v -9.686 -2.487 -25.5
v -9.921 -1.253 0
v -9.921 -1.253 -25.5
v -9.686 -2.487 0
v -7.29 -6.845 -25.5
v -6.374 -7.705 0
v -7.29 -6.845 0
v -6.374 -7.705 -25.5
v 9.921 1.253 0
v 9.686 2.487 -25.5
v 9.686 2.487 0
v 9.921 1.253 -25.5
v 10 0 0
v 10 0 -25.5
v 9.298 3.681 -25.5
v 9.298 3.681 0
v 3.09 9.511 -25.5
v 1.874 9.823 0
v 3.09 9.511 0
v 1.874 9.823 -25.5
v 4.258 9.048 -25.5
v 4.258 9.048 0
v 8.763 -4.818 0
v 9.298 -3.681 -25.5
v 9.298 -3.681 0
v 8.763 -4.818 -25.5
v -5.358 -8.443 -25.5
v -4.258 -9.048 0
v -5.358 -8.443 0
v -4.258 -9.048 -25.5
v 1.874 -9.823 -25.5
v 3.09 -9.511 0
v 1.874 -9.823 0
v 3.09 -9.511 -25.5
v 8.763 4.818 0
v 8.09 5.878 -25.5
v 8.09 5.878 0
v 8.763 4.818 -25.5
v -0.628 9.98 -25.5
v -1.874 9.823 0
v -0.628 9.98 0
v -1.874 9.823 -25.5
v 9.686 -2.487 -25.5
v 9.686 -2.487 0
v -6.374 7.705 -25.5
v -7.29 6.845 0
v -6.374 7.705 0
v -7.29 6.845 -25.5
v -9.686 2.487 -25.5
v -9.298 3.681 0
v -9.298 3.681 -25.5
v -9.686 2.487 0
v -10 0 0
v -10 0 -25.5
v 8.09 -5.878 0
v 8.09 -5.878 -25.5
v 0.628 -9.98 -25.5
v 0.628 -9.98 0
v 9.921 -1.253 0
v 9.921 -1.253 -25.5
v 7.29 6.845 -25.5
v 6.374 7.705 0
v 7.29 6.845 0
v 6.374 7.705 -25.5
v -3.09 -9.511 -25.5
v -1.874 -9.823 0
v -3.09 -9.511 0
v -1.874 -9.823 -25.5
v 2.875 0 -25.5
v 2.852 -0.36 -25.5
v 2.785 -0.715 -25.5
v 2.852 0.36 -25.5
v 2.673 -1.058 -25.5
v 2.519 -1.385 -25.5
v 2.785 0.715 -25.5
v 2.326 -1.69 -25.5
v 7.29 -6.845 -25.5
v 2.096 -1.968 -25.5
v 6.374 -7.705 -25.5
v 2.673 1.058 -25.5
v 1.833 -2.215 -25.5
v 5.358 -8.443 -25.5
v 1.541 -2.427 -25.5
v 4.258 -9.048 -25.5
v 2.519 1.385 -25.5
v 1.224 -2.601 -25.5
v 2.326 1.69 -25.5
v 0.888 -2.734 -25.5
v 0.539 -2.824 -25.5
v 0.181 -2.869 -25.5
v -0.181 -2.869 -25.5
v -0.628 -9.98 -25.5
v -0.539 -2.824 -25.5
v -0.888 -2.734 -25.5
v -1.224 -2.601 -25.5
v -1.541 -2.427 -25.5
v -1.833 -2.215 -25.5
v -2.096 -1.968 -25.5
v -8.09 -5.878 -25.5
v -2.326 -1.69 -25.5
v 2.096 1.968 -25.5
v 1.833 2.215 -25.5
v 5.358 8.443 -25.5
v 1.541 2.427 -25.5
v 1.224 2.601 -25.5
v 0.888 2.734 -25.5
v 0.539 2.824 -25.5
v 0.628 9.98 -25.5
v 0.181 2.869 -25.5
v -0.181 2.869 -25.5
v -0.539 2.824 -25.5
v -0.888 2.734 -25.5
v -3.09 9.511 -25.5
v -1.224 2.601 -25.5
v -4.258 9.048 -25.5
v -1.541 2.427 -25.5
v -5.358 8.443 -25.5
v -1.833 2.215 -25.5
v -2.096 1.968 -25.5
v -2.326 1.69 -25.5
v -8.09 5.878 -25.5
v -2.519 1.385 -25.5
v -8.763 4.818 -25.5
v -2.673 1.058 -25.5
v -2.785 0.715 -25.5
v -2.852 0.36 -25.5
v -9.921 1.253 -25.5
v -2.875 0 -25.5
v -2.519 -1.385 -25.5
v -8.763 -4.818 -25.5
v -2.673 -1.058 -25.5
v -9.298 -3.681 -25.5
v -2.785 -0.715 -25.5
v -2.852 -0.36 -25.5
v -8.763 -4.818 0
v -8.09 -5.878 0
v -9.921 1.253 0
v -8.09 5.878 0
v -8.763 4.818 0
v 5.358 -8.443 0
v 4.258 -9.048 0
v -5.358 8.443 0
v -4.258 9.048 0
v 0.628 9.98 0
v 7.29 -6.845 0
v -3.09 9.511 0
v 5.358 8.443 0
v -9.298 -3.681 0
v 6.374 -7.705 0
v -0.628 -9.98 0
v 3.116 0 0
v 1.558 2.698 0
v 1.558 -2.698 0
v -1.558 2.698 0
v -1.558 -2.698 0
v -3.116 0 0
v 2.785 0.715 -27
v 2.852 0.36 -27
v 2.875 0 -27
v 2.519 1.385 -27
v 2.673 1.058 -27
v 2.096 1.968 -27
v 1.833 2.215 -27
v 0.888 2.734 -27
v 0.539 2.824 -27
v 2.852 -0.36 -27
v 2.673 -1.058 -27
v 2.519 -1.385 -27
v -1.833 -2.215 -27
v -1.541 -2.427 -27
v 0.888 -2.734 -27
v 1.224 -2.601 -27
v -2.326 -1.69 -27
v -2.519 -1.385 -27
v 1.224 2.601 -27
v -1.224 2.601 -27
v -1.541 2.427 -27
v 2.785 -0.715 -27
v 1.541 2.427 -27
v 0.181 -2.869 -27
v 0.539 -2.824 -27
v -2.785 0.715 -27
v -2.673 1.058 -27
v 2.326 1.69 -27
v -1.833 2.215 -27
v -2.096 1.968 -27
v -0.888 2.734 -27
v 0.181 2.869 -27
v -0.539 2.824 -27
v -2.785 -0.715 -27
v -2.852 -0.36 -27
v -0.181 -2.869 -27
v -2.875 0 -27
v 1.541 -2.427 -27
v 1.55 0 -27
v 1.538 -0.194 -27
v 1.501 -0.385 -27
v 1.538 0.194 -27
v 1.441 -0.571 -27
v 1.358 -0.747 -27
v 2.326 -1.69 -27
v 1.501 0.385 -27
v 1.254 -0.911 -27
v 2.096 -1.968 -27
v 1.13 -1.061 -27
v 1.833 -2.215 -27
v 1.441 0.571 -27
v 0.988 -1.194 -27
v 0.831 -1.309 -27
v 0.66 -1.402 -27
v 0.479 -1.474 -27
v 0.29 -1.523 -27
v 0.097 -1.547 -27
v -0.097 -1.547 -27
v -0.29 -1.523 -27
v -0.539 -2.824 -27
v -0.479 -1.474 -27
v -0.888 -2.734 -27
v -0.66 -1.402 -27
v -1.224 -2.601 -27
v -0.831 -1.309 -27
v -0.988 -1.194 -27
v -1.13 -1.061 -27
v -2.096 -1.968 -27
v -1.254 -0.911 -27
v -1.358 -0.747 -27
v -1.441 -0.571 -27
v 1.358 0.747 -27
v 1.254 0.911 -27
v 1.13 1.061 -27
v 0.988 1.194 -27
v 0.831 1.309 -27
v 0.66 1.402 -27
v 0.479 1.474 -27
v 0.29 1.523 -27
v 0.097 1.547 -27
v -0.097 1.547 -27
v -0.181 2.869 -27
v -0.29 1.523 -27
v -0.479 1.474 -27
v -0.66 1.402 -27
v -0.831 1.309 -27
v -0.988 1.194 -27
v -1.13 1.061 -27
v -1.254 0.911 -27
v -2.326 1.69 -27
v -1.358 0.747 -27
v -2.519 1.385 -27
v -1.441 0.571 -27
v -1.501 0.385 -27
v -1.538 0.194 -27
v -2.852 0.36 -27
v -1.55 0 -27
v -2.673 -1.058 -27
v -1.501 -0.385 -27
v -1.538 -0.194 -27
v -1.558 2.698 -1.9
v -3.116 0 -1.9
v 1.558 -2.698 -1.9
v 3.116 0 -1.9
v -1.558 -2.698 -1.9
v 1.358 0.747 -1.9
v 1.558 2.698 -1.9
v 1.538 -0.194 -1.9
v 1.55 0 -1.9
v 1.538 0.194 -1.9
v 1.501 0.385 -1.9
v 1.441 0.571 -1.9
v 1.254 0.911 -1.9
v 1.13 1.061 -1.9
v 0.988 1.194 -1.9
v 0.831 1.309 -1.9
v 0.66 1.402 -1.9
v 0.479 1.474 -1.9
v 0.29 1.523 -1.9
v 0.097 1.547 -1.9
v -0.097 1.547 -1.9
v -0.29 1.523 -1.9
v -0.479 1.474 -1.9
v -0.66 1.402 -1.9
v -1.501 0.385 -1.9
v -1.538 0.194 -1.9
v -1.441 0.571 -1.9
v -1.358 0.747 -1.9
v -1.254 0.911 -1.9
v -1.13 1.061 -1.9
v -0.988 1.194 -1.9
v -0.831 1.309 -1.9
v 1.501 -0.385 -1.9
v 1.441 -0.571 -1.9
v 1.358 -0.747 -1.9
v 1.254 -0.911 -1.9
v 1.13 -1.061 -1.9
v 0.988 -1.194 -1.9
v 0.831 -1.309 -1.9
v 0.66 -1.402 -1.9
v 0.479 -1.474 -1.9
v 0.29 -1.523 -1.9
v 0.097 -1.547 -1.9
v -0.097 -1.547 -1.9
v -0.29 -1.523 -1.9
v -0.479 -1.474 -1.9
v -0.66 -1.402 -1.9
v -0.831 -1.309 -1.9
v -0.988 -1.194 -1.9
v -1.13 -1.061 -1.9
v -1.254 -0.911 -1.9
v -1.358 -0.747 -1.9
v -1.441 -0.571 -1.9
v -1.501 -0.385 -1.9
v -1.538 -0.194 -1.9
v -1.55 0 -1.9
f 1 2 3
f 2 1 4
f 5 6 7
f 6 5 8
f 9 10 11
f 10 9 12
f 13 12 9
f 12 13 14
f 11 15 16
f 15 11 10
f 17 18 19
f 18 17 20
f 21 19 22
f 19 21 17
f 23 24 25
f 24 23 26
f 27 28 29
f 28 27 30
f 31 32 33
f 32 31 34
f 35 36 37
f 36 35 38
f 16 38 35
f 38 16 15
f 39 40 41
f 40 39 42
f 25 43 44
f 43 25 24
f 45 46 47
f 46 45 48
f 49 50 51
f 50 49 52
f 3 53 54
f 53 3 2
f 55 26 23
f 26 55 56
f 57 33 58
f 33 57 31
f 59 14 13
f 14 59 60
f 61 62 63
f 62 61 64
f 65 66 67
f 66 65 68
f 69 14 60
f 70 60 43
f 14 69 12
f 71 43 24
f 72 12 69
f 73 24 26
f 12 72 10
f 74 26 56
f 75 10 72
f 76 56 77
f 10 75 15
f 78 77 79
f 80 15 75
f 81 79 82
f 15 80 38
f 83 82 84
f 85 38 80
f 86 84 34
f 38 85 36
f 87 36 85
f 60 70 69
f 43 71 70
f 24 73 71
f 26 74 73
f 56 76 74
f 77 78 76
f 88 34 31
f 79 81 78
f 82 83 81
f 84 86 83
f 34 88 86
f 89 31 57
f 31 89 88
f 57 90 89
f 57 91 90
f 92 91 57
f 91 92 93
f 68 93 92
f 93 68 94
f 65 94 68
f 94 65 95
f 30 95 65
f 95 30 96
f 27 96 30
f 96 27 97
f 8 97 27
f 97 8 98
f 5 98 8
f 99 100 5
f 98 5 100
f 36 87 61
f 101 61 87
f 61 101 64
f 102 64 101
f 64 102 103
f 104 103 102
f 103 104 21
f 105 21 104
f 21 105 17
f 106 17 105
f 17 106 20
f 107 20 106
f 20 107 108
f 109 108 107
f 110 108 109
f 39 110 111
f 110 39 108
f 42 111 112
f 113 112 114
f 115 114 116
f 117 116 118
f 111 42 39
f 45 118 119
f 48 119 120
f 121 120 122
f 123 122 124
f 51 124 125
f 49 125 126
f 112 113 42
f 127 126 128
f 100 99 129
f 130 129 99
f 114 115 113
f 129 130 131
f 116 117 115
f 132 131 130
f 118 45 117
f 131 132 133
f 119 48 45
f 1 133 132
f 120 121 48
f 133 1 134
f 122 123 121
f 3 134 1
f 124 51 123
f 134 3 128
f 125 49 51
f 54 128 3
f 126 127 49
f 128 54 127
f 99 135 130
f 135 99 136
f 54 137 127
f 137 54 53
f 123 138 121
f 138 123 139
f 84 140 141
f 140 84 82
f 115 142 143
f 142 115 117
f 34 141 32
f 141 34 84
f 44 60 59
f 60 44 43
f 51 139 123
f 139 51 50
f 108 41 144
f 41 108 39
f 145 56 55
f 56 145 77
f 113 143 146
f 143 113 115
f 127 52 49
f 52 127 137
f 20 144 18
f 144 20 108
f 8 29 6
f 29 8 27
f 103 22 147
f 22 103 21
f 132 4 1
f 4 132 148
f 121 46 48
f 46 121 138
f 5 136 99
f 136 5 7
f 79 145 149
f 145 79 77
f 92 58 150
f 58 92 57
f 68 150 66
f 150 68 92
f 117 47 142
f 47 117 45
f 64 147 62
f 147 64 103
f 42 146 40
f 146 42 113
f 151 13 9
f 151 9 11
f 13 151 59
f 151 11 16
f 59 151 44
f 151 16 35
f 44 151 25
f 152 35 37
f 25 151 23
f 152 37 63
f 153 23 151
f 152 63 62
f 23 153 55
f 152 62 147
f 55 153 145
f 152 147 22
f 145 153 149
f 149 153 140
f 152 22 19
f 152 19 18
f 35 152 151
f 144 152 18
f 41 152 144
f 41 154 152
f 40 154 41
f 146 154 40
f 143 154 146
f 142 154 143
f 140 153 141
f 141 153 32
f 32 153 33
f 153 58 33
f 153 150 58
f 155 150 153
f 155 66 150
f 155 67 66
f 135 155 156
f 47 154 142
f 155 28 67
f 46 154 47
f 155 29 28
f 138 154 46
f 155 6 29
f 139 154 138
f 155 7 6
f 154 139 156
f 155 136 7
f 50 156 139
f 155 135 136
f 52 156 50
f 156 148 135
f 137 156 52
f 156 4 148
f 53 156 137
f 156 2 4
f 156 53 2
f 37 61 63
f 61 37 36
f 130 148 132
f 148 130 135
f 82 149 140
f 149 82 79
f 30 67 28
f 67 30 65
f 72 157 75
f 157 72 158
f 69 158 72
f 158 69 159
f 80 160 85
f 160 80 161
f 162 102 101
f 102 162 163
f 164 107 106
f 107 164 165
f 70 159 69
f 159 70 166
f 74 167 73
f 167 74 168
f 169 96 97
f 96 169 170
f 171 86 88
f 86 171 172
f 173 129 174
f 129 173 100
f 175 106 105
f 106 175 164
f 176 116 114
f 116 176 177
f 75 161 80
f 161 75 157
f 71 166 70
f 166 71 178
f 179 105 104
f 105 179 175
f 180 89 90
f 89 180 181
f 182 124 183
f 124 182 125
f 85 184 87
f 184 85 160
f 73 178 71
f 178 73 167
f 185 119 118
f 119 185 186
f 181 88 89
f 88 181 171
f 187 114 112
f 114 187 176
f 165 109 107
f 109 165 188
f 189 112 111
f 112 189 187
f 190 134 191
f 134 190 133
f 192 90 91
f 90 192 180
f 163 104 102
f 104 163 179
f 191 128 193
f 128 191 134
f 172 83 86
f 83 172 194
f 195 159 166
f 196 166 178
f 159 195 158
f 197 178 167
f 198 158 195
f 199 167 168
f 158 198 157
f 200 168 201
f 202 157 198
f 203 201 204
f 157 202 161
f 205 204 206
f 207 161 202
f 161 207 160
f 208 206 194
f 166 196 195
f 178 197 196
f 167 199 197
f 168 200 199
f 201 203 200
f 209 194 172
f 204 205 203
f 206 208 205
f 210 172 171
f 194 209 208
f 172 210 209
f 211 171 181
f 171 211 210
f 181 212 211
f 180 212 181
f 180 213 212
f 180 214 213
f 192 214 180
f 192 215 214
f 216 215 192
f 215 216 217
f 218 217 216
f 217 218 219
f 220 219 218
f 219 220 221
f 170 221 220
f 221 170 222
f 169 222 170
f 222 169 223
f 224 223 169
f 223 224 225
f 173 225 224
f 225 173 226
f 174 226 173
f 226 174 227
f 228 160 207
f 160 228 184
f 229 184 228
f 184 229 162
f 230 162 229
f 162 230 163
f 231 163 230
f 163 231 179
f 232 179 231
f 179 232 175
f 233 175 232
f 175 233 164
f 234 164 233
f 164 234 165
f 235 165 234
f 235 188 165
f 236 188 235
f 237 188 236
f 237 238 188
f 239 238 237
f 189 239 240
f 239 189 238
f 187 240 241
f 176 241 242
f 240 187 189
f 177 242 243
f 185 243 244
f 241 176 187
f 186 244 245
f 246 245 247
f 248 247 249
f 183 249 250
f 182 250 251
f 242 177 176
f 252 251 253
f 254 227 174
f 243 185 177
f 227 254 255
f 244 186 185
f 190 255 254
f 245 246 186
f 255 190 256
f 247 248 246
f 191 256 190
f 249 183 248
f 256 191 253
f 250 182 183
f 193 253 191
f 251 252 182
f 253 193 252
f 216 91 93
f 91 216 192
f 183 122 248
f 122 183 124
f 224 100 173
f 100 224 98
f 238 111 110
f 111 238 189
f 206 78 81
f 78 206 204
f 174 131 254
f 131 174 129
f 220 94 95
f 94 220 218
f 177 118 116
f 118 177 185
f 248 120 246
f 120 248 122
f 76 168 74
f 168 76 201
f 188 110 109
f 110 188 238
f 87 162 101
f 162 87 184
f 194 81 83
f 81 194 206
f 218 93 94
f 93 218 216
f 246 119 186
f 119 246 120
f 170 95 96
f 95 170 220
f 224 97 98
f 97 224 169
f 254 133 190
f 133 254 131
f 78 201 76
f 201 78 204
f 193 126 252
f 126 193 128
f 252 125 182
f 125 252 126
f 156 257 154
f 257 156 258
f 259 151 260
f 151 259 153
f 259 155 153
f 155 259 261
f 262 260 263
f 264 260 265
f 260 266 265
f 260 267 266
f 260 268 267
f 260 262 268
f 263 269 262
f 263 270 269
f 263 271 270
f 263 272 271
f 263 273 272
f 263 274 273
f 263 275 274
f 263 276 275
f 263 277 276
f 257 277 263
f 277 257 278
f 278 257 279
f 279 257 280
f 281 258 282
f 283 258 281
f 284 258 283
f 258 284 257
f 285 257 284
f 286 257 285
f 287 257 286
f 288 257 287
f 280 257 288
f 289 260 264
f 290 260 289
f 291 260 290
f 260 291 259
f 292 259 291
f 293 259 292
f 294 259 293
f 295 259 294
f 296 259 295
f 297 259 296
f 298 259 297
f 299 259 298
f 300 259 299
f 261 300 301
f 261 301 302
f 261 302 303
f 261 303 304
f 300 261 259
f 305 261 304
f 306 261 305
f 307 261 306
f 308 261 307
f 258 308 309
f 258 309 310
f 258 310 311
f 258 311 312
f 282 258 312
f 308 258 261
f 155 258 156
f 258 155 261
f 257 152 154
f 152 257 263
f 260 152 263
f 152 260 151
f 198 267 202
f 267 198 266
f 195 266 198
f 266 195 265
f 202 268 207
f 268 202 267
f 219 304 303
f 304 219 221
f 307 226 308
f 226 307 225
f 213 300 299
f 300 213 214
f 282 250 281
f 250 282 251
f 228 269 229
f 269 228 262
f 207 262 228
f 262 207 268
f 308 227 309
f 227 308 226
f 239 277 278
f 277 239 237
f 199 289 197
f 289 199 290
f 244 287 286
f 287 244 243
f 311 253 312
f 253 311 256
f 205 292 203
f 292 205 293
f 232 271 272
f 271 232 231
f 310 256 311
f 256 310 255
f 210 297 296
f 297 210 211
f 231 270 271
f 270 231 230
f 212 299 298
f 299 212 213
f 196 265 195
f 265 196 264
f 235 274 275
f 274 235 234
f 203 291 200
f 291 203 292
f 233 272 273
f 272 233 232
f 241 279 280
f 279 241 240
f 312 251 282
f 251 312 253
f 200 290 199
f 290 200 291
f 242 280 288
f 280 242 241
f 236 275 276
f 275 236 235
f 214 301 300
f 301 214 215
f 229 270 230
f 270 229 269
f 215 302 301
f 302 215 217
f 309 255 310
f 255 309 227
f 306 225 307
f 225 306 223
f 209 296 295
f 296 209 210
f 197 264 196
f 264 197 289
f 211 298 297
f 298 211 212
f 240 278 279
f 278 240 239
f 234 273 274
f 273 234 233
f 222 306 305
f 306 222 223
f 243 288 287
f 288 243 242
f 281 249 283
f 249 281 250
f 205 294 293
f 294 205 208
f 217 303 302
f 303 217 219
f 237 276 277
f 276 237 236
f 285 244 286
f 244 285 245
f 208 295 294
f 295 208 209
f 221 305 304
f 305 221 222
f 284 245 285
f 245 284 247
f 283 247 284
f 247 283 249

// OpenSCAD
$fn = 50;


difference() {
	union() {
		translate(v = [0, 0, -25.5000000000]) {
			cylinder(h = 25.5000000000, r = 10.0000000000);
		}
		#translate(v = [0, 0, -27.0000000000]) {
			cylinder(h = 27, r = 2.8750000000);
		}
	}
	union() {
		translate(v = [0, 0, 0]) {
			rotate(a = [0, 0, 0]) {
				difference() {
					union() {
						translate(v = [0, 0, -1.9000000000]) {
							linear_extrude(height = 1.9000000000) {
								polygon(points = [[3.1158000000, 0.0000000000], [1.5579000000, 2.6983619531], [-1.5579000000, 2.6983619531], [-3.1158000000, 0.0000000000], [-1.5579000000, -2.6983619531], [1.5579000000, -2.6983619531]]);
							}
						}
					}
					union();
				}
			}
		}
		#translate(v = [0, 0, -100.0000000000]) {
			cylinder(h = 200, r = 1.5500000000);
		}
	}
}
